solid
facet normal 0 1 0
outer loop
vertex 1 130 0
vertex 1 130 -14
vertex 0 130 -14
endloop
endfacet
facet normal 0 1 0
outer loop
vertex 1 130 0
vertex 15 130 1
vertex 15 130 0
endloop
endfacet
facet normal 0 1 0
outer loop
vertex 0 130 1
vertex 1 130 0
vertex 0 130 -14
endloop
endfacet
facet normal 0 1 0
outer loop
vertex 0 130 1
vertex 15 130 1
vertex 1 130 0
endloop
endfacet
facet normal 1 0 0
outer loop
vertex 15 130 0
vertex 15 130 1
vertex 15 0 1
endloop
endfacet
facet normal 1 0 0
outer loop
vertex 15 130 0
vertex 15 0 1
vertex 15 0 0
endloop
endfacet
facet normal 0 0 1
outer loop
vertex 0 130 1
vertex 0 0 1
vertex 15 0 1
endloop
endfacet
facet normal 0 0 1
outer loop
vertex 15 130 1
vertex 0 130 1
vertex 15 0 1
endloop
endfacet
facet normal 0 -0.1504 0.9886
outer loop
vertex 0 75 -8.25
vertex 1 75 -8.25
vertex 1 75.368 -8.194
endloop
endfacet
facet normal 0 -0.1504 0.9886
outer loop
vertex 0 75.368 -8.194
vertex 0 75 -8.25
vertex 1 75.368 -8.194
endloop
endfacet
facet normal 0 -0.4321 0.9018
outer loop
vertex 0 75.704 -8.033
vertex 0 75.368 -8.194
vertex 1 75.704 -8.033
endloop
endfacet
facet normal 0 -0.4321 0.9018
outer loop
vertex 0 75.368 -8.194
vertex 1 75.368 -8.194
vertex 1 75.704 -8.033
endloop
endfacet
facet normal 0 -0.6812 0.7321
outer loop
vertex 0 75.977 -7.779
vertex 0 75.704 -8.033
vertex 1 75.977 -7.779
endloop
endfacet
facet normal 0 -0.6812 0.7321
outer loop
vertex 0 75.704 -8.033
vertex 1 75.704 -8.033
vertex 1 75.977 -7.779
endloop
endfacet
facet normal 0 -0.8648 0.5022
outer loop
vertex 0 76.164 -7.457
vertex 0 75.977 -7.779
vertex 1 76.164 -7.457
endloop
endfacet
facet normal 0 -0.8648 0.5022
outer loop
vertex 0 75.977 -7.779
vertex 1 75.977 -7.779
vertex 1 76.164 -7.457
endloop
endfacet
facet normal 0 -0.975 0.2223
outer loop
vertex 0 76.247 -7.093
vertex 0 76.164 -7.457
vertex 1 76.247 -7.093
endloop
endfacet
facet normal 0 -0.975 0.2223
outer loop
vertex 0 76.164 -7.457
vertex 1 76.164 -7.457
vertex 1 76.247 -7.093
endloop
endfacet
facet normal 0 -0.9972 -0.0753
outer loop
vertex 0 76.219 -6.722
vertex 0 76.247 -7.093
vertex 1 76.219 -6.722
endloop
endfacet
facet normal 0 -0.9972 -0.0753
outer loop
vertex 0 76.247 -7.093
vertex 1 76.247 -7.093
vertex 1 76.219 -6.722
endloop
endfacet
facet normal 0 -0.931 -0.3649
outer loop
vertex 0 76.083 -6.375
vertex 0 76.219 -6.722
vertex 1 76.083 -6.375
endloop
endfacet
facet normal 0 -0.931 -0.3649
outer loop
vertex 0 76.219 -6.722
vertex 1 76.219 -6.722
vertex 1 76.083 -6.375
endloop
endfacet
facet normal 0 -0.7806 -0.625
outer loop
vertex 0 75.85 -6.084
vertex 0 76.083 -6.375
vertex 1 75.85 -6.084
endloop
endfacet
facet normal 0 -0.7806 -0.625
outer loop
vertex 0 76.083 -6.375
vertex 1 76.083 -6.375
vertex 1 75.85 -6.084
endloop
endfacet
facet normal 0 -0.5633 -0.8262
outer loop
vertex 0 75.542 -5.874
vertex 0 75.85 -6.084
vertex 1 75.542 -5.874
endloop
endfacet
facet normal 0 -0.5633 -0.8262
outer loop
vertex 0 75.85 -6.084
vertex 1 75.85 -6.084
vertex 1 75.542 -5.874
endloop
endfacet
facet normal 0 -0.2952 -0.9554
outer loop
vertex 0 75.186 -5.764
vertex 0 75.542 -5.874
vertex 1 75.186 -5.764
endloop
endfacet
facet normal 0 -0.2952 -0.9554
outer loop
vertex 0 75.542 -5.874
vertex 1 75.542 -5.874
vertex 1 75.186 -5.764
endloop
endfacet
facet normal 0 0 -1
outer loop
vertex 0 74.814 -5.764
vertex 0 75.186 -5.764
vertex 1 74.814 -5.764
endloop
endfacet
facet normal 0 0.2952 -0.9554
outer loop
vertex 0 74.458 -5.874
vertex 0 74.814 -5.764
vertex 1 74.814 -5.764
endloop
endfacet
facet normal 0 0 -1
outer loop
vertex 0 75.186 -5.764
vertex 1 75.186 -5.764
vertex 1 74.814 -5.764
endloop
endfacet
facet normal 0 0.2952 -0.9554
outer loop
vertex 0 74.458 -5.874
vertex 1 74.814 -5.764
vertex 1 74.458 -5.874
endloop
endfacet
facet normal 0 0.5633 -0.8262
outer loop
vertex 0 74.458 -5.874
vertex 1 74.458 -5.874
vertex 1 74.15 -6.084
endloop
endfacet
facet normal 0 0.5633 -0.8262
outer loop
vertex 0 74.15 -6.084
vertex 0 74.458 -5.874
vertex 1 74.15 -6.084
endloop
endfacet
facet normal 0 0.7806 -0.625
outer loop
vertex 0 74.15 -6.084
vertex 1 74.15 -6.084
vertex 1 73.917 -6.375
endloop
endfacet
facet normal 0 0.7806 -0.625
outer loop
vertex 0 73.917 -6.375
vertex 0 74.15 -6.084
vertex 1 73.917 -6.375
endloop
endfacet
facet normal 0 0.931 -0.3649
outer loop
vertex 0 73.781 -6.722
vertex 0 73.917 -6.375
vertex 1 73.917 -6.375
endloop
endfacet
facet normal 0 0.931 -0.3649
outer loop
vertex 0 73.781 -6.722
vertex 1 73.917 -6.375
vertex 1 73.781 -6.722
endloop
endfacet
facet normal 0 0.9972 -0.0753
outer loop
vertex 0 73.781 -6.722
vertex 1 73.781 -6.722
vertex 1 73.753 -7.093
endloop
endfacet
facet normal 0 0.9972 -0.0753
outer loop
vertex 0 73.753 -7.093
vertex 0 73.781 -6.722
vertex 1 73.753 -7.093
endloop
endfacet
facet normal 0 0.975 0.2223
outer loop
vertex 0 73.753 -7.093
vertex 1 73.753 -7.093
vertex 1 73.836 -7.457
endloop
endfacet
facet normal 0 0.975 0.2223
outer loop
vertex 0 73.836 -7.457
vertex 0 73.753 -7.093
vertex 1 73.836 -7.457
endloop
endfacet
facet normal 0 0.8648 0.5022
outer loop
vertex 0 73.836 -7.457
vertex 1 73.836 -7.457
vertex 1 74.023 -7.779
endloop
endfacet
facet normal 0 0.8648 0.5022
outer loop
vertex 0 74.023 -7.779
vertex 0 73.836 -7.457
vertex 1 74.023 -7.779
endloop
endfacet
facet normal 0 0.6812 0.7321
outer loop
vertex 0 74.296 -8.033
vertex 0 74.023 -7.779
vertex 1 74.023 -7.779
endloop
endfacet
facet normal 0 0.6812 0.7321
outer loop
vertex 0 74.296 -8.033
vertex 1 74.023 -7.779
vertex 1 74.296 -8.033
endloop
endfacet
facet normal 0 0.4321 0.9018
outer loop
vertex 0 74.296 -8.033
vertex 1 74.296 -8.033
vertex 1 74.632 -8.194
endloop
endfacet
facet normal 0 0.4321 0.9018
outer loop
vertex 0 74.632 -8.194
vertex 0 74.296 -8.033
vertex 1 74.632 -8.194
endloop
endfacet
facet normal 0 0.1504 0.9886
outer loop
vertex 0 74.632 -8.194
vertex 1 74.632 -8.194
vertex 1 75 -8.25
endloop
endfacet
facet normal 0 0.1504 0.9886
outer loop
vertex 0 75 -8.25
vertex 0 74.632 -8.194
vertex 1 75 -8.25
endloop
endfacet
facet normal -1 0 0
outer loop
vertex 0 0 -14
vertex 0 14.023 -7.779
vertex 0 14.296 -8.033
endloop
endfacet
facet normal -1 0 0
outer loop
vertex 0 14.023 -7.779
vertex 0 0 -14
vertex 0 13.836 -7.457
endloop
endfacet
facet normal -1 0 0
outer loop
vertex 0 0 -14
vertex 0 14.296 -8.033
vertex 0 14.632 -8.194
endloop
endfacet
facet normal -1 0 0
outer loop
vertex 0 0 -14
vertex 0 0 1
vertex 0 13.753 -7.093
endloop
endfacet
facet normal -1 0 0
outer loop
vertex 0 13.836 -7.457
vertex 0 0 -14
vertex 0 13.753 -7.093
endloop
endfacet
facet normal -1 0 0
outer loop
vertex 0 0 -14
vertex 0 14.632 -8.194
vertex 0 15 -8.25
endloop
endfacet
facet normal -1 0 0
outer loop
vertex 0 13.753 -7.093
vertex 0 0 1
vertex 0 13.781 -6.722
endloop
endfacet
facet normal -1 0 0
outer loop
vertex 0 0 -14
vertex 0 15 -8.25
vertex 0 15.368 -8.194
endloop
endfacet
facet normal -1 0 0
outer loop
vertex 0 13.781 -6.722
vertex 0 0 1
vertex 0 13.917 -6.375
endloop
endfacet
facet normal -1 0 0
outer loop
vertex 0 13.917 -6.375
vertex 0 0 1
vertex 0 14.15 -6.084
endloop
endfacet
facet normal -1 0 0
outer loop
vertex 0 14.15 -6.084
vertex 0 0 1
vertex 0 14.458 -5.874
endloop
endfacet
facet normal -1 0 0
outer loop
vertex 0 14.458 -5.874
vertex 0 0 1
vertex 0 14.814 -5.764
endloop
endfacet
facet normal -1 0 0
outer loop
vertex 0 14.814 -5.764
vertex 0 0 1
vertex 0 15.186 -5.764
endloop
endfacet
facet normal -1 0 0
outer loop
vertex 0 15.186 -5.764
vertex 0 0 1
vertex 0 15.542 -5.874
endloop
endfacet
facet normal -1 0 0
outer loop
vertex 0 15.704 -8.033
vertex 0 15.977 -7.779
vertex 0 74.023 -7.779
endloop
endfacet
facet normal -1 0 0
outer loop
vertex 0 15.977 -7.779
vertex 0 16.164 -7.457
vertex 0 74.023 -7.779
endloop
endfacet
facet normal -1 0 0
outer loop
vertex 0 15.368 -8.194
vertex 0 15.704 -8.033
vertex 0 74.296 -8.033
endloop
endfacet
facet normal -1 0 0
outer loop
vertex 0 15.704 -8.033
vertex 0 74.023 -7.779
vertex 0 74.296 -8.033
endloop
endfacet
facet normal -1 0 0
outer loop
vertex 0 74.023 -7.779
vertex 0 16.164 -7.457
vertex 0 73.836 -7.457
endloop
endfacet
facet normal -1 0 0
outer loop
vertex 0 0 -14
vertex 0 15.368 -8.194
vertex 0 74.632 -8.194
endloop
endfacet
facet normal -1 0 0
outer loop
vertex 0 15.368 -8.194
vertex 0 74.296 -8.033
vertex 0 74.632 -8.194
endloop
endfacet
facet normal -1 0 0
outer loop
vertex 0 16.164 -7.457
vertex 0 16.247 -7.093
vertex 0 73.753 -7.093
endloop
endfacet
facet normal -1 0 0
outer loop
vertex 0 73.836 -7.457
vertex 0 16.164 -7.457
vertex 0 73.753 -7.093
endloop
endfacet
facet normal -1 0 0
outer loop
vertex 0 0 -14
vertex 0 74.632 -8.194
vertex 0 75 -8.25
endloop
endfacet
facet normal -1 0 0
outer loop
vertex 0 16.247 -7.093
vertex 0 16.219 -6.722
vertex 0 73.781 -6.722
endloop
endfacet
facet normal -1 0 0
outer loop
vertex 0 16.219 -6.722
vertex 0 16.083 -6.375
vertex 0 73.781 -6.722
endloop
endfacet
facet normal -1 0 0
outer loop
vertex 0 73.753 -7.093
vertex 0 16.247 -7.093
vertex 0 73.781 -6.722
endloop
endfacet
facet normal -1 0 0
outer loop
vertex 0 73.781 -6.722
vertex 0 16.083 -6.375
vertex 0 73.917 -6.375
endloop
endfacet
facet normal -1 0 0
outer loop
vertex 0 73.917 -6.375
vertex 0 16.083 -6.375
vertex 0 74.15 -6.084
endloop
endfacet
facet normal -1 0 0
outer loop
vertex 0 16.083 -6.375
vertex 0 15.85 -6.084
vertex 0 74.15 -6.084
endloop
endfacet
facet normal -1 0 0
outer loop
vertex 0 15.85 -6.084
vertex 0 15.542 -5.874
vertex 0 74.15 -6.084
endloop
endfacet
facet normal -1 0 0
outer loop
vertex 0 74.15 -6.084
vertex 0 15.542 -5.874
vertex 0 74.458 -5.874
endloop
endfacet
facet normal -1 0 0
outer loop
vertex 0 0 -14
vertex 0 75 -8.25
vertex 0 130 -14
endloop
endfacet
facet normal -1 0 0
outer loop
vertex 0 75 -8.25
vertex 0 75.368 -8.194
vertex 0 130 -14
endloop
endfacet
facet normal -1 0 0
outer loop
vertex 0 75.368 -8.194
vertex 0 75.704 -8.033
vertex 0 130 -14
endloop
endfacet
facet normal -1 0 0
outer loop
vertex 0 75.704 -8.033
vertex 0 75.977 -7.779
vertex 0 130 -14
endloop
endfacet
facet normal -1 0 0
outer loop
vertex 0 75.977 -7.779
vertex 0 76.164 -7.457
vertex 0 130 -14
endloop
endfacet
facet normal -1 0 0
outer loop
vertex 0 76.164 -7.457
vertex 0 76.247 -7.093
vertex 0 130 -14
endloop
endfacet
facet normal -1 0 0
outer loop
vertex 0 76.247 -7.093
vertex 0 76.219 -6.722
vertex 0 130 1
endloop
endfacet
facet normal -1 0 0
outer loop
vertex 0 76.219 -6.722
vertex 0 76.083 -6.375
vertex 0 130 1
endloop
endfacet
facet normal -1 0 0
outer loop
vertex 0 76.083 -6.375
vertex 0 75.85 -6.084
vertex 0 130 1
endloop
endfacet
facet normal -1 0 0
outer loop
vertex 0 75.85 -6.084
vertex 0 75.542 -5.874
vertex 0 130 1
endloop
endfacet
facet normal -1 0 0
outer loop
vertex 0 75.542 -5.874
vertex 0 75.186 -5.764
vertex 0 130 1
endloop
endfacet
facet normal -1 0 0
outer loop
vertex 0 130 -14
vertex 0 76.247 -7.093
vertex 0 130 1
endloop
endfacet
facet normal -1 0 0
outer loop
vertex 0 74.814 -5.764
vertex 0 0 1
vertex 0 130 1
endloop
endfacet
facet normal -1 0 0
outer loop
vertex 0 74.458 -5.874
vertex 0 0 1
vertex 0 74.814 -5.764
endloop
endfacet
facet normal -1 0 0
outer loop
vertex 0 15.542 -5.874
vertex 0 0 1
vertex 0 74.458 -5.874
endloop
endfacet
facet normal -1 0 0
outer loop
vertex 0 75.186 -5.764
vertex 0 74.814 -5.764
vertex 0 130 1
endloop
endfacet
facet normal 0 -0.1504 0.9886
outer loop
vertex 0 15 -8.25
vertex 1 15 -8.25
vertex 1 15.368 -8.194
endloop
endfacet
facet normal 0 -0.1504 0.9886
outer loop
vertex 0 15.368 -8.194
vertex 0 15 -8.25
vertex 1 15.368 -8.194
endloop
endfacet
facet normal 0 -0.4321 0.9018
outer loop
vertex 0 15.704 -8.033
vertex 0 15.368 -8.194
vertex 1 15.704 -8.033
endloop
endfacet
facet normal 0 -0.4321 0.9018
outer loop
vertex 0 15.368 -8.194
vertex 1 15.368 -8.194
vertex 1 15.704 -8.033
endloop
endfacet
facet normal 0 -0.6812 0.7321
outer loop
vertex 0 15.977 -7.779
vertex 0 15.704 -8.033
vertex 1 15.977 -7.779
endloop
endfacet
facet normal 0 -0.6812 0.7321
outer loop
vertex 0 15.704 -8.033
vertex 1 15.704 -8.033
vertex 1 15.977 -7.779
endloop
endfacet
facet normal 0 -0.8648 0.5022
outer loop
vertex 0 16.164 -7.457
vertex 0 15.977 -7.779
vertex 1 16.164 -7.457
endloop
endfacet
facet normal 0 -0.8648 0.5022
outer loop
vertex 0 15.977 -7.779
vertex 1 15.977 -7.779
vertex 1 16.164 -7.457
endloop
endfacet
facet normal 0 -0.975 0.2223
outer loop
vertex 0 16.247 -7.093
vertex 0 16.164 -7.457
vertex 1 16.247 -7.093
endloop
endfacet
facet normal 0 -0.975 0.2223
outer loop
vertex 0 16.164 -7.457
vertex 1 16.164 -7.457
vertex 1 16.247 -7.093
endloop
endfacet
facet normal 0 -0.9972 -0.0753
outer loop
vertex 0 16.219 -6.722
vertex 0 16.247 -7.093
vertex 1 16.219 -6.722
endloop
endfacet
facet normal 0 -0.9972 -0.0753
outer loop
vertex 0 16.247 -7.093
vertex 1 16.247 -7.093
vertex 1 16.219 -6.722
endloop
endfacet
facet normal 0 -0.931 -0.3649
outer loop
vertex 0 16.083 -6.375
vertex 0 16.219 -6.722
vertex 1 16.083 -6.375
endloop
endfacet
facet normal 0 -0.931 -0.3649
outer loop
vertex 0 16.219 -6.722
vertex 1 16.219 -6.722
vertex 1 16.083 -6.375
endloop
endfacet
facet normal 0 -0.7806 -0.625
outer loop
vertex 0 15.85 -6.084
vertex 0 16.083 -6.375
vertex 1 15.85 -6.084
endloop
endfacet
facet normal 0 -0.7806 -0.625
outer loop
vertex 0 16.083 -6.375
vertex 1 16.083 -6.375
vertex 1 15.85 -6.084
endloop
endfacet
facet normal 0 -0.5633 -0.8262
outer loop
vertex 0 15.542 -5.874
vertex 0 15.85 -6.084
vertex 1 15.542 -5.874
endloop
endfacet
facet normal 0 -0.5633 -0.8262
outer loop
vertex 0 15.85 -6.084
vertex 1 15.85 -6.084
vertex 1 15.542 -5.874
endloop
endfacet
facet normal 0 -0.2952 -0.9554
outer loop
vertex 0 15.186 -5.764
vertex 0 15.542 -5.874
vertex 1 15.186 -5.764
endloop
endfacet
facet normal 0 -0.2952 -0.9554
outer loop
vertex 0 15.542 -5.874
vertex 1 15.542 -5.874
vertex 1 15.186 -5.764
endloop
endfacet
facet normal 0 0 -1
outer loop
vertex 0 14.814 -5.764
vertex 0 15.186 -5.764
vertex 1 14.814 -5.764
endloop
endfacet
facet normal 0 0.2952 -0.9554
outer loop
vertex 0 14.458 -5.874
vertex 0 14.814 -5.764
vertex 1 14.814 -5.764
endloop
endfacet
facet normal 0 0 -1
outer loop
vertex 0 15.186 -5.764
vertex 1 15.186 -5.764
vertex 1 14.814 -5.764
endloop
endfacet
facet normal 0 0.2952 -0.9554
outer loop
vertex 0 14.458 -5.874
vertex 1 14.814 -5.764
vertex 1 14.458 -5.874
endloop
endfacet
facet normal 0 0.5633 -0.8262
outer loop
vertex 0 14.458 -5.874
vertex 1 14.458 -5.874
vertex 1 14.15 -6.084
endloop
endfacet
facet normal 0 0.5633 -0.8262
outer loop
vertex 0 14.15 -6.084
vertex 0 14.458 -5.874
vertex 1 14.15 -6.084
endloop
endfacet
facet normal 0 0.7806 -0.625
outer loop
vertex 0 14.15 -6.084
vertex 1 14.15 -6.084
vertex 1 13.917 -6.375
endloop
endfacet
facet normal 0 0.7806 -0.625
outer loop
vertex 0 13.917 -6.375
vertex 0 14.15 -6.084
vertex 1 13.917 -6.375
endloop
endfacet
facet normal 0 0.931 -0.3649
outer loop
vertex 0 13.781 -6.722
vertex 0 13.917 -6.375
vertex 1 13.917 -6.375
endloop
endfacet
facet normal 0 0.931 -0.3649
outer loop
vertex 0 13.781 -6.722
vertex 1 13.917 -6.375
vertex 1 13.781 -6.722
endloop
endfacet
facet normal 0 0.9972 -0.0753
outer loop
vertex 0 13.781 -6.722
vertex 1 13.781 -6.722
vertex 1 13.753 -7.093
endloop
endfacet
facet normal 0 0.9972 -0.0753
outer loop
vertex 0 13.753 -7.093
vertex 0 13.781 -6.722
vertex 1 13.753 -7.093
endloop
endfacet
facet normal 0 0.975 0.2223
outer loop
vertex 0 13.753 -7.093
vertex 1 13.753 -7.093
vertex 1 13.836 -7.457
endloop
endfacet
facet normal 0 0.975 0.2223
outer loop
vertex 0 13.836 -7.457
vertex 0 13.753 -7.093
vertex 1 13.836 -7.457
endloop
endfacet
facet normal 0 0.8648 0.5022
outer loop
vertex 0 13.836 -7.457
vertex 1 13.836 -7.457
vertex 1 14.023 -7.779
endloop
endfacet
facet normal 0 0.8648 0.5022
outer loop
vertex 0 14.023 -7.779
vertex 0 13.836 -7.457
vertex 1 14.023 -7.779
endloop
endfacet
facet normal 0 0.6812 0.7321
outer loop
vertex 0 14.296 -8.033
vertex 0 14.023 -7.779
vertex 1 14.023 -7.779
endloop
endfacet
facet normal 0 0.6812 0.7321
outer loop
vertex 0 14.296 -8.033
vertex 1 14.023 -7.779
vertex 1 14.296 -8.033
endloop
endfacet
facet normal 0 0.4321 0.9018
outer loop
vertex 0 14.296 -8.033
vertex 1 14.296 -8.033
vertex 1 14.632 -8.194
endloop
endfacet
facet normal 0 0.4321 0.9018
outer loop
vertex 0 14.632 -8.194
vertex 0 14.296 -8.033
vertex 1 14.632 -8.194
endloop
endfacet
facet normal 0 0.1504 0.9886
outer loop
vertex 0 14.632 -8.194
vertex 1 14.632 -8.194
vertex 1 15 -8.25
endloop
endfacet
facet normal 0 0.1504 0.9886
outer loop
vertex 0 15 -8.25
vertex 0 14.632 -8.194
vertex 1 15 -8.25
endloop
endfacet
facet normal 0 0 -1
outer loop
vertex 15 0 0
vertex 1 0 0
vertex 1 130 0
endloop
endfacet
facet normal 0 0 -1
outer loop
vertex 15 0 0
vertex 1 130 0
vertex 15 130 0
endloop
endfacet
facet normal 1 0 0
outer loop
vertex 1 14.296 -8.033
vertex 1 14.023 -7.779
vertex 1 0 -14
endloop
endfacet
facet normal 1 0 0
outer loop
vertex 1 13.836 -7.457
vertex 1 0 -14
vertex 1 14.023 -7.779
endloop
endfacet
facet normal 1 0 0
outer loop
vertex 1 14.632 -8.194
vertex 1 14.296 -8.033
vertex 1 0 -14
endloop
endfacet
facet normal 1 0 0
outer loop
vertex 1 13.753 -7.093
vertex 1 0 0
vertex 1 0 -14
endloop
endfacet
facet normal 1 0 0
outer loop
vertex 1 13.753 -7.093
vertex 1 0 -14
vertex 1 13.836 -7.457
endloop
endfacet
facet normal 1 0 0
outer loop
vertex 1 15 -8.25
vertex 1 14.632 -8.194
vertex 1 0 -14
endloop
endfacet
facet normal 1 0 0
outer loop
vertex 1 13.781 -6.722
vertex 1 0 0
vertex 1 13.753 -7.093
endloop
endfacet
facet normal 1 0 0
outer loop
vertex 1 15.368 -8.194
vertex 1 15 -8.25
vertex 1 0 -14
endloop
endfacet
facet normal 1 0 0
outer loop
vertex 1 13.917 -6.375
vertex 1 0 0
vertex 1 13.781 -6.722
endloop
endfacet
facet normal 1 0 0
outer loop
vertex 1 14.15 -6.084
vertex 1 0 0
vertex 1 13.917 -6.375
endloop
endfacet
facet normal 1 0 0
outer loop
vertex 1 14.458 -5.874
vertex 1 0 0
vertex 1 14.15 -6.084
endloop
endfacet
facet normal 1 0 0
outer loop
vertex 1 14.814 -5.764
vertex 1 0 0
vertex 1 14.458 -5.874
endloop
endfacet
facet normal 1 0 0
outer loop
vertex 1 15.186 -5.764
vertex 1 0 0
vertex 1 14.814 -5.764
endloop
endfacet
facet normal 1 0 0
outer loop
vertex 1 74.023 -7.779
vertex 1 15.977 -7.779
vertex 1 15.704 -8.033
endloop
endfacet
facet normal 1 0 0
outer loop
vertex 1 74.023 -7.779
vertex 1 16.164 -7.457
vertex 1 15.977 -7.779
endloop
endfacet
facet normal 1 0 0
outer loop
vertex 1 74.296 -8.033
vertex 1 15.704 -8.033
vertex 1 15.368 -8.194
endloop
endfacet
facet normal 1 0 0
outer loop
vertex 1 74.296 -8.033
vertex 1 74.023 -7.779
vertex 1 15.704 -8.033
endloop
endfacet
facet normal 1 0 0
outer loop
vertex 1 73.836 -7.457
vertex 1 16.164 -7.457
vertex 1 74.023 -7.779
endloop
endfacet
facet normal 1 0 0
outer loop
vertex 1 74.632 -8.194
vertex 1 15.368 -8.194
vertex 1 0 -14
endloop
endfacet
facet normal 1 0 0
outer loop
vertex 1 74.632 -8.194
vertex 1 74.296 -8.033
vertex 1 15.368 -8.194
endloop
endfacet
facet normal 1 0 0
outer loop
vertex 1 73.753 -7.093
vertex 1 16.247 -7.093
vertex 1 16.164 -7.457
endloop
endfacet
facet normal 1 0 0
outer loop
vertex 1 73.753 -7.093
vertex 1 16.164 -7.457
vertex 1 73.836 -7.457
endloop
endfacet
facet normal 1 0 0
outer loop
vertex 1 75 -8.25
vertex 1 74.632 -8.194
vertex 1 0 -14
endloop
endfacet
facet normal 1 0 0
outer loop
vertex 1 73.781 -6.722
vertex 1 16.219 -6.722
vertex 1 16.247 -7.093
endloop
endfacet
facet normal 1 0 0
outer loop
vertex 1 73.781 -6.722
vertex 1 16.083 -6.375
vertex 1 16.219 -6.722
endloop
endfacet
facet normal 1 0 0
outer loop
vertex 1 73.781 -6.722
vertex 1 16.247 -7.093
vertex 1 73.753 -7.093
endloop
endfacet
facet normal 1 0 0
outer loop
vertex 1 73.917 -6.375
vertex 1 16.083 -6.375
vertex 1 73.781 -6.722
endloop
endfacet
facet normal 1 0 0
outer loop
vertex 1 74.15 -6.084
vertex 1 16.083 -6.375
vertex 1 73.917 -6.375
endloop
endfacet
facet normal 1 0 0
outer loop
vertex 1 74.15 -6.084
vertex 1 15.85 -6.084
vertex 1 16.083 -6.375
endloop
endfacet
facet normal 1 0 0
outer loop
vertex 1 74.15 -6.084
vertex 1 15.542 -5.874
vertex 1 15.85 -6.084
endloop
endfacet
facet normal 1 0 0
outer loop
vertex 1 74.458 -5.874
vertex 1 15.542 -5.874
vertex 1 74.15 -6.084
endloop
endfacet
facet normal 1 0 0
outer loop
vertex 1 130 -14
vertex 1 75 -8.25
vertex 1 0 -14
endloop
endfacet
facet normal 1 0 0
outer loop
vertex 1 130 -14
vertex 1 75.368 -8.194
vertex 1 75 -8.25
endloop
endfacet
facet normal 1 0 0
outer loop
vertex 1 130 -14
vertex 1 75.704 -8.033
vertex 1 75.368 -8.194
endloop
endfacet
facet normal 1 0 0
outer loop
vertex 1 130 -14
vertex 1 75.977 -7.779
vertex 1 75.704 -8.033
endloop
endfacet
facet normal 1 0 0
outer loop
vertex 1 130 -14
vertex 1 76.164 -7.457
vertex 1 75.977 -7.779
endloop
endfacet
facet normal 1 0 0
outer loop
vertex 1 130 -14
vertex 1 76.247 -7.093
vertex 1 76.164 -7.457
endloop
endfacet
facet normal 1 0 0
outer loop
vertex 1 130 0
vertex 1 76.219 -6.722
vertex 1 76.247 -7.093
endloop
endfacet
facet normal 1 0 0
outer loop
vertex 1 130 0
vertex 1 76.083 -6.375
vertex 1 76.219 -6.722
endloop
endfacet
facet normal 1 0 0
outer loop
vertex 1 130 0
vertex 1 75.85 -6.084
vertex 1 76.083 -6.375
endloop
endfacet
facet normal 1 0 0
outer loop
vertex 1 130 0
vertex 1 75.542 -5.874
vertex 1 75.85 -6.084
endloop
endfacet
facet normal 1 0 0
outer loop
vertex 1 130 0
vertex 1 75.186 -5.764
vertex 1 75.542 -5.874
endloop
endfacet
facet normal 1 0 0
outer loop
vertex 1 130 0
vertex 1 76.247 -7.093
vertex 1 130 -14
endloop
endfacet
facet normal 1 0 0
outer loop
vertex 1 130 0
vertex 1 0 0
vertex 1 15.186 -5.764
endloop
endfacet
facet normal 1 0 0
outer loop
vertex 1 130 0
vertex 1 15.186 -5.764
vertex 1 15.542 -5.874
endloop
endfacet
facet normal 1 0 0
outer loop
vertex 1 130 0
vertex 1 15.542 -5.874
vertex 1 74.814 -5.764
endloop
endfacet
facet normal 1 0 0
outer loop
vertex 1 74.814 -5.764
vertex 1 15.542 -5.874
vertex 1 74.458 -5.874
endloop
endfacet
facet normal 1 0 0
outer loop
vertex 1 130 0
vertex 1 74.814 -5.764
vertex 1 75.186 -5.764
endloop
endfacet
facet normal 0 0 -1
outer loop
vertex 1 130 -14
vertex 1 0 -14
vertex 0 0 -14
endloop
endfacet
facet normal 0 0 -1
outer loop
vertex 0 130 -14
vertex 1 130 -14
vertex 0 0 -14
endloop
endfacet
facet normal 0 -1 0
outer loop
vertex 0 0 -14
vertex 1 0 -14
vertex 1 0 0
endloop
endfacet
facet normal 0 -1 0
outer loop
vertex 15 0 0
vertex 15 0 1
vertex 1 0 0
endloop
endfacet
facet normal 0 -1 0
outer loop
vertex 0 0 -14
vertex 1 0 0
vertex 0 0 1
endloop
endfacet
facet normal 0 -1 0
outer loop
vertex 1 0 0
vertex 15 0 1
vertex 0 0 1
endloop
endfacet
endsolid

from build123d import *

# Parameters (mm, degrees)
SKETCH_1_W      = 15
SKETCH_1_H      = 1
EXTRUDE_1_DEPTH = 130
SKETCH_3_W      = 1
SKETCH_3_H      = 130
EXTRUDE_2_DEPTH = 14
M3X0_5_1_D      = 2.5


with BuildPart() as part:
    # ｽｹｯﾁ1 → ﾎﾞｽ - 押し出し1 (new body)
    with BuildSketch(Plane(origin=(0, 0, 0), x_dir=(1, 0, 0), z_dir=(0, 1, 0))):
        with Locations((7.5, -0.5)):
            Rectangle(SKETCH_1_W, SKETCH_1_H)
    extrude(amount=EXTRUDE_1_DEPTH)

    # ｽｹｯﾁ3 → ﾎﾞｽ - 押し出し2 (add)
    with BuildSketch(Plane(origin=(0, 0, 0), x_dir=(-1, 0, 0), z_dir=(0, 0, -1))):
        with Locations((-0.5, 65)):
            Rectangle(SKETCH_3_W, SKETCH_3_H)
    extrude(amount=EXTRUDE_2_DEPTH)

    # M3x0.5 ねじ穴1 (through all)
    with Locations(Plane.ZY):
        with Locations((-7, 15), (-7, 75)):
            Hole(M3X0_5_1_D / 2)


solid = part.part
